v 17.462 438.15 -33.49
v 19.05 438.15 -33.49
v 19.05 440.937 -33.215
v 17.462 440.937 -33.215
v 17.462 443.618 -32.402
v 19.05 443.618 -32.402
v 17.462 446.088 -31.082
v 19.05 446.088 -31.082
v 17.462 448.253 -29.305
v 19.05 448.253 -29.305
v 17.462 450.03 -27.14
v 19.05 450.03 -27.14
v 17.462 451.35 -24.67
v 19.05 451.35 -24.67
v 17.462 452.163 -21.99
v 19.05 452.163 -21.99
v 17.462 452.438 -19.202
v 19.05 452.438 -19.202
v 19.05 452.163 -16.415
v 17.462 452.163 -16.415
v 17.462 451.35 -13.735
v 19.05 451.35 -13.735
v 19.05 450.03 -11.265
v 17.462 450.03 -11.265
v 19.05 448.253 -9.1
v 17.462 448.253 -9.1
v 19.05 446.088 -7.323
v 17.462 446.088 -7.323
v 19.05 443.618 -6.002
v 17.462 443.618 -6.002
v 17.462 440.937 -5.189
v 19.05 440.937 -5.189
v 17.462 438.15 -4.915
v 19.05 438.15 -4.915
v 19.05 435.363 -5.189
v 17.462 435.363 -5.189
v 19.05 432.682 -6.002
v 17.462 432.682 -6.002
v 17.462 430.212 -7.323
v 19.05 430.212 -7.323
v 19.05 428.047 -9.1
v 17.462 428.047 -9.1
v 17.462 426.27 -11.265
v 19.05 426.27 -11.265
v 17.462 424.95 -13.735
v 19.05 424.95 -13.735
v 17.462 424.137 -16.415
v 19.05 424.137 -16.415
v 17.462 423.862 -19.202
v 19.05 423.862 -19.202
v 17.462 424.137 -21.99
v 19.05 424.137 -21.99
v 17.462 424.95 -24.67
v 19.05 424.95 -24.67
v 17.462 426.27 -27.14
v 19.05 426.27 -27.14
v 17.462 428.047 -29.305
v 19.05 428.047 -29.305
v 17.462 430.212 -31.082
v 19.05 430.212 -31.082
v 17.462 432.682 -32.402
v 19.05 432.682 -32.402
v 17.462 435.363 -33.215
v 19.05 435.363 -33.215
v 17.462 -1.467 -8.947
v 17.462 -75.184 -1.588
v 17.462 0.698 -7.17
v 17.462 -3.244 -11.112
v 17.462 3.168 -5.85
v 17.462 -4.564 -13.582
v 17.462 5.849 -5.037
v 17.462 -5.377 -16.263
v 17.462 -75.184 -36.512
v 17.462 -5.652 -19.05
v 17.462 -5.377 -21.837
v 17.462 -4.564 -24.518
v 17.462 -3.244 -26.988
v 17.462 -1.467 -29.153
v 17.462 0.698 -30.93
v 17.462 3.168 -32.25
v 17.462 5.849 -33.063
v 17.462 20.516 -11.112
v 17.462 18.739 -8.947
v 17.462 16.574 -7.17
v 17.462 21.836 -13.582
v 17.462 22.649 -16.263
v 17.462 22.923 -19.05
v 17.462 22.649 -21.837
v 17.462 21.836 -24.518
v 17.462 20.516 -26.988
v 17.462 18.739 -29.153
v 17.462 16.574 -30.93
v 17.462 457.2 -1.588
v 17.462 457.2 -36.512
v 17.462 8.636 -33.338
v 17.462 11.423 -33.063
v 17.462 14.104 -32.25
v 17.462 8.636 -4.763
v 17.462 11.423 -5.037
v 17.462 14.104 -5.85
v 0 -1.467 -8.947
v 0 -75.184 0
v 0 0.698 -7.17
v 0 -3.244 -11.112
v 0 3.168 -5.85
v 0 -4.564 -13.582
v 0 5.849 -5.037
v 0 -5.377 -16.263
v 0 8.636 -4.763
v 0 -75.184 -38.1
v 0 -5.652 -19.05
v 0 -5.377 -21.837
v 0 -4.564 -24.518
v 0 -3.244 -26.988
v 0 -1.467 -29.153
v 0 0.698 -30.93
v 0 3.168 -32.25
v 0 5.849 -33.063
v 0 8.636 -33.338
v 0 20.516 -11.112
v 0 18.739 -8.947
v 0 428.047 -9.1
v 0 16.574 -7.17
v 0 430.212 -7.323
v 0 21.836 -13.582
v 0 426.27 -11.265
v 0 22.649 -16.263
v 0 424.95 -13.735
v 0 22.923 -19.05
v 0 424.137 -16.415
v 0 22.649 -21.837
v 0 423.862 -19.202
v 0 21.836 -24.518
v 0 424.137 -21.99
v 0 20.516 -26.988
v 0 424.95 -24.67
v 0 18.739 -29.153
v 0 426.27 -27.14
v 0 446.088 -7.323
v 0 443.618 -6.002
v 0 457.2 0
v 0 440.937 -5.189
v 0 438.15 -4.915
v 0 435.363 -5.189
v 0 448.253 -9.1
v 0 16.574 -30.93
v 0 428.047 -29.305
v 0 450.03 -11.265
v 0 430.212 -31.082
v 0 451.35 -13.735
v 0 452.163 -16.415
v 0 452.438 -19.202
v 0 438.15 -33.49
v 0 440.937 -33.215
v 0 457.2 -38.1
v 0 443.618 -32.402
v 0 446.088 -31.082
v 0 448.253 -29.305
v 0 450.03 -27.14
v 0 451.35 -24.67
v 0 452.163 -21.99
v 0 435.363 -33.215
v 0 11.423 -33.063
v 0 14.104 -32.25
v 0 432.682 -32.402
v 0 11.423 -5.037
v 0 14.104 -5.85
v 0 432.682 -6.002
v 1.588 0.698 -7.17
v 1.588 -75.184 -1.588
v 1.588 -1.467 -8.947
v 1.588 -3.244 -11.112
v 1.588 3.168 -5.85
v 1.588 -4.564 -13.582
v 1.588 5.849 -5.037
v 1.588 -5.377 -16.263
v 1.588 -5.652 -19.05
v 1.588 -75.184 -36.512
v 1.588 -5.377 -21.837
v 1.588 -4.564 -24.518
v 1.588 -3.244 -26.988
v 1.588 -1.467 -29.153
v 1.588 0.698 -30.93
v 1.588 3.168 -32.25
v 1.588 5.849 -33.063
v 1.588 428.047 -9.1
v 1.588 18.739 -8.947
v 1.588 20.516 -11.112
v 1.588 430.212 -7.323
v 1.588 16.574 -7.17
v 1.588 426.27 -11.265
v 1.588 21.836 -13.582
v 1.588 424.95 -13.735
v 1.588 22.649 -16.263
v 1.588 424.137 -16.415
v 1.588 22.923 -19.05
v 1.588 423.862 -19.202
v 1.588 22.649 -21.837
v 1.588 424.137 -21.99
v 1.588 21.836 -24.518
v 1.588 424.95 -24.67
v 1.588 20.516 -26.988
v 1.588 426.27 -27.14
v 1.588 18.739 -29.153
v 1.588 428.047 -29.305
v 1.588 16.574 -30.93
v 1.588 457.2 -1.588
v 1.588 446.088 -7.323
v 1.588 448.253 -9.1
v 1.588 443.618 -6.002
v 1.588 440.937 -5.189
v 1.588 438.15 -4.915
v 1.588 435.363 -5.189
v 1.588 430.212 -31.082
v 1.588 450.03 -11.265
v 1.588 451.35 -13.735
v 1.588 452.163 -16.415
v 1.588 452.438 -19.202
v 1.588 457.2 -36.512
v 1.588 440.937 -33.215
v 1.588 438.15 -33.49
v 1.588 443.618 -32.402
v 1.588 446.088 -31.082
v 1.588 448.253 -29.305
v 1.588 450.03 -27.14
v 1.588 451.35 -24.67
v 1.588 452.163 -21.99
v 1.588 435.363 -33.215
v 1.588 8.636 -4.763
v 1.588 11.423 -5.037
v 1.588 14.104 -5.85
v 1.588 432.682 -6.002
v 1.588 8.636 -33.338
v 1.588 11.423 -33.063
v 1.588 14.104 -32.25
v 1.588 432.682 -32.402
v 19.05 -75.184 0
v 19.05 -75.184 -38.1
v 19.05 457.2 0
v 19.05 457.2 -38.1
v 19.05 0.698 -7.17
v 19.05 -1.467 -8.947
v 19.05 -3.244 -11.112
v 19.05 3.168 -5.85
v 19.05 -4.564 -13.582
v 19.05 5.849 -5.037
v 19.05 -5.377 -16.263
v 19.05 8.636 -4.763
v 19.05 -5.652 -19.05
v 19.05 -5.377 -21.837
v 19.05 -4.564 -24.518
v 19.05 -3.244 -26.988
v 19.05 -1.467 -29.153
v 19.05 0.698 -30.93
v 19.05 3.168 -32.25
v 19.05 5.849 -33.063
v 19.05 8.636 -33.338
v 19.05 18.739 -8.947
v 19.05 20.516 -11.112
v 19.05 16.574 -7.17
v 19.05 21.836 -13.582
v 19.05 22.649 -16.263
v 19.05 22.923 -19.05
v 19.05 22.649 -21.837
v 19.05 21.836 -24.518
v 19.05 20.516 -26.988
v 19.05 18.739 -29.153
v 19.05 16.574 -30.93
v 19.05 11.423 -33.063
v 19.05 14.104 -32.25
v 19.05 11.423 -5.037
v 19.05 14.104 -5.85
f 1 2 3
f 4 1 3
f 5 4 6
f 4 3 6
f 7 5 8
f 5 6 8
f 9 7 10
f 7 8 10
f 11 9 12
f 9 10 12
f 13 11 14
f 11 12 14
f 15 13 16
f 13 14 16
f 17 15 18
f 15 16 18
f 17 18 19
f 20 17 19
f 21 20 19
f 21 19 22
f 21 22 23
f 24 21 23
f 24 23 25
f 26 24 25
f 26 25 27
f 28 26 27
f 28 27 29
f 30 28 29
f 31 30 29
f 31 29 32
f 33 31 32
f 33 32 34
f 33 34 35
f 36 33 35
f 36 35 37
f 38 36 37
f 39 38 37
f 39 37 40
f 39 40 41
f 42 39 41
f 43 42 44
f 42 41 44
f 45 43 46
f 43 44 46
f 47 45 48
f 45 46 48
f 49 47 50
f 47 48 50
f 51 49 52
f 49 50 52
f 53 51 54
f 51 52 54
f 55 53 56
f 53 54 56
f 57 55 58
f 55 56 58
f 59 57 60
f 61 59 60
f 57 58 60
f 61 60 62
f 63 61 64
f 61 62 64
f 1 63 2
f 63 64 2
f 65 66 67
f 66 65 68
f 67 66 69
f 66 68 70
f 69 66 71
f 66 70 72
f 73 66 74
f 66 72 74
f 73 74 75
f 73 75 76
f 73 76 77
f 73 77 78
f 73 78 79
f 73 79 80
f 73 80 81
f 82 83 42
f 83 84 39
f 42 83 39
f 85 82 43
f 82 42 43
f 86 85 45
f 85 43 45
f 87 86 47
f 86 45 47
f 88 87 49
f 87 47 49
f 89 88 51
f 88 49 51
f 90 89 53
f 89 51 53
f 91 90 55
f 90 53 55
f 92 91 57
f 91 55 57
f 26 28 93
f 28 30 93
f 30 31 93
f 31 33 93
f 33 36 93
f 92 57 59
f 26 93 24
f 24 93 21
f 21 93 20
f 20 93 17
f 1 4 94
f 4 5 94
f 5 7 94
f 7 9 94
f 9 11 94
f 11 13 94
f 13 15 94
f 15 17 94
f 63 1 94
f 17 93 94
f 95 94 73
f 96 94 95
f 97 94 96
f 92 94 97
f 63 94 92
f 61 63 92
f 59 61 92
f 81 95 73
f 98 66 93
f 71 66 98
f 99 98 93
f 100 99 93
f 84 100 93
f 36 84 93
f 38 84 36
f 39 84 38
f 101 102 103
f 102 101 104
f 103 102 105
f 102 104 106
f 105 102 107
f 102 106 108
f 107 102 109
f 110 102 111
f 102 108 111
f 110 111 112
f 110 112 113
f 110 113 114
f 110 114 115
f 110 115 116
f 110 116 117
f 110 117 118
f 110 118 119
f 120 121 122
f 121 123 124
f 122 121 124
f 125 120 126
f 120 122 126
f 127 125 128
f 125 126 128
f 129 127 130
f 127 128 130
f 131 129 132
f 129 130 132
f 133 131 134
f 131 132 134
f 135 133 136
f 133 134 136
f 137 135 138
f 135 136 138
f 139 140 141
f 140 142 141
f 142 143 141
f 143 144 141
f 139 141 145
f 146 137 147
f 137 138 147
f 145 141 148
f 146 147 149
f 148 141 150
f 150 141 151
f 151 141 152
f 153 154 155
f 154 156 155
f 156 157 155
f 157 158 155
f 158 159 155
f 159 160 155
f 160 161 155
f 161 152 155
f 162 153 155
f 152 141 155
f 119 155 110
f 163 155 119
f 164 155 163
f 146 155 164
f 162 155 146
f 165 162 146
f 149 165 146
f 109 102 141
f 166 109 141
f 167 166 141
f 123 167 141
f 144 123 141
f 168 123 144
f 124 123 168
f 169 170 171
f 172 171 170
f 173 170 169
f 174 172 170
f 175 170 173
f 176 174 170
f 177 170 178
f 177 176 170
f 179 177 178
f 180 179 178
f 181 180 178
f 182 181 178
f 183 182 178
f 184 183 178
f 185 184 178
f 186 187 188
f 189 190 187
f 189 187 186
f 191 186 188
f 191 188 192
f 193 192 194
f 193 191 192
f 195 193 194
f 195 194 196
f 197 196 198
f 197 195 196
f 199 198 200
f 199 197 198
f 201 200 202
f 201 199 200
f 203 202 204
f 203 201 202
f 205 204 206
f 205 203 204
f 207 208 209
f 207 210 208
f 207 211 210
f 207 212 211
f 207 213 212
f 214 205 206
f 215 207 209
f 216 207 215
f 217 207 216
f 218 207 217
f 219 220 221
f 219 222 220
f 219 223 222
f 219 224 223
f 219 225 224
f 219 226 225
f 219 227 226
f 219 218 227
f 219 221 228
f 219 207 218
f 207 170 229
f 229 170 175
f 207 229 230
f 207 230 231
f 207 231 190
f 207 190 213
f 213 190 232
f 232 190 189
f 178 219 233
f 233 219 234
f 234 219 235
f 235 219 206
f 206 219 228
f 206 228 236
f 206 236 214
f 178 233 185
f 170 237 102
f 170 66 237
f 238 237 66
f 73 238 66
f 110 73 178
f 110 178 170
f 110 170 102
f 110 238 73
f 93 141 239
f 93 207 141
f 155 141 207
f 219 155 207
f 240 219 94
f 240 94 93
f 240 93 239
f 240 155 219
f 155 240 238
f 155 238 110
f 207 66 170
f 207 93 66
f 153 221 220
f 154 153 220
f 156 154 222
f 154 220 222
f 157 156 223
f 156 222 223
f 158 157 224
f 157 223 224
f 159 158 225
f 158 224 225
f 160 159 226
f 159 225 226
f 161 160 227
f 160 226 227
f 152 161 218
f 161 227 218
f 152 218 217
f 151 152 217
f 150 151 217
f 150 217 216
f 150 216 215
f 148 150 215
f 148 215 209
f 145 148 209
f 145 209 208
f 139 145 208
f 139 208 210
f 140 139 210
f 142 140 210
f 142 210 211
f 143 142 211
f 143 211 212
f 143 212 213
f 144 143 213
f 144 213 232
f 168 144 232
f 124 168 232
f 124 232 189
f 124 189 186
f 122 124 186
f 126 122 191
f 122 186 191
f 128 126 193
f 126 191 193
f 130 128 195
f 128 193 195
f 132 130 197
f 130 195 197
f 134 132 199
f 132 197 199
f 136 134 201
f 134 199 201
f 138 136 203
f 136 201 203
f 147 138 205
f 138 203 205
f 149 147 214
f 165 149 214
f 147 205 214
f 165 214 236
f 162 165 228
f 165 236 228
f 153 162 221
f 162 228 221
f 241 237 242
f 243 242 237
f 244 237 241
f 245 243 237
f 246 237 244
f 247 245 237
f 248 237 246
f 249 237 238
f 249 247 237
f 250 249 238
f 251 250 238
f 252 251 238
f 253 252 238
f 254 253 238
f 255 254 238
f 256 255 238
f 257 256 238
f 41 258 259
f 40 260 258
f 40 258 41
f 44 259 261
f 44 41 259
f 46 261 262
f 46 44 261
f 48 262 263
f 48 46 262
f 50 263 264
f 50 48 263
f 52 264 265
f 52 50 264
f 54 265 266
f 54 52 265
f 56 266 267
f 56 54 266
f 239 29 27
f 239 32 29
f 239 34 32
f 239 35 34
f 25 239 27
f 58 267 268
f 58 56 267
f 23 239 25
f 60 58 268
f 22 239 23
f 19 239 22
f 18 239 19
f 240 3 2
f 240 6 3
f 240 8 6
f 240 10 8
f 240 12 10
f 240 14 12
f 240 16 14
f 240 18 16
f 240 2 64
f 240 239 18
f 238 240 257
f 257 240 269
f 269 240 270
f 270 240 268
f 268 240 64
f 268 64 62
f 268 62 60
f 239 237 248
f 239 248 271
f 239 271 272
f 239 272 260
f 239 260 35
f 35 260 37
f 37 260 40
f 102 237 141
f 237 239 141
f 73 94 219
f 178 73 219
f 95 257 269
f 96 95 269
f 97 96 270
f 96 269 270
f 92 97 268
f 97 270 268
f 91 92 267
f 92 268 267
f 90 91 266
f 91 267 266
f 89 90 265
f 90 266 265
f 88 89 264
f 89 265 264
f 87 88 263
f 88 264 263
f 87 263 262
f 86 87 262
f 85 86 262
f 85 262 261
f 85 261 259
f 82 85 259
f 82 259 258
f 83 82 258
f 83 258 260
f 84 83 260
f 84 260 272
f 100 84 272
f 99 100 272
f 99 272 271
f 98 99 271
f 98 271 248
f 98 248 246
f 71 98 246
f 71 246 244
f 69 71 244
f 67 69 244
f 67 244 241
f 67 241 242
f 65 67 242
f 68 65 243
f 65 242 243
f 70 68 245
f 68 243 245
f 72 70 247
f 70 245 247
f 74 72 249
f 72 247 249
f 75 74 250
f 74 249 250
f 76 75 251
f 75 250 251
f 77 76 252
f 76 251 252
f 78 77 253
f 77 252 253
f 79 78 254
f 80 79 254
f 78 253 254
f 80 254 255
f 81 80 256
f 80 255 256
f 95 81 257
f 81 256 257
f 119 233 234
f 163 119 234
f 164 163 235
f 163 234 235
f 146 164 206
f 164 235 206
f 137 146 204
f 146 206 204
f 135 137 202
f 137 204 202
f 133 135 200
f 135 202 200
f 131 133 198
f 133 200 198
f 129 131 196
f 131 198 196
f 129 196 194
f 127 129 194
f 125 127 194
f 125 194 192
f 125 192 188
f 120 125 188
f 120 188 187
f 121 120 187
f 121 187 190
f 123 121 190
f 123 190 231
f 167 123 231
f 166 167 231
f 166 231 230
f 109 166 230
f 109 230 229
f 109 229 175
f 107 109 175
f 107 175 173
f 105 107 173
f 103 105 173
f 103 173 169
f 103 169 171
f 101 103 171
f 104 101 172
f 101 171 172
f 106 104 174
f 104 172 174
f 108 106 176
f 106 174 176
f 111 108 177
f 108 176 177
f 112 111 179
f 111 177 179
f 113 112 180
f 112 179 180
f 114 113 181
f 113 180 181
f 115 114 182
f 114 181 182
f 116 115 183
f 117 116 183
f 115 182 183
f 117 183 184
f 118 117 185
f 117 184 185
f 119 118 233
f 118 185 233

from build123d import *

# Parameters (mm, degrees)
SKETCH1_W           = 19.05
SKETCH1_H           = 38.1
SKETCH1_W_2         = 15.875
SKETCH1_H_2         = 34.925
EXTRUDE_THIN1_DEPTH = 457.2
SKETCH3_W           = 19.05
SKETCH3_H           = 38.1
SKETCH3_W_2         = 15.875
SKETCH3_H_2         = 34.925
EXTRUDE_THIN2_DEPTH = 75.184
SKETCH4_R           = 14.2875
CUT_EXTRUDE1_DEPTH  = 20.05


with BuildPart() as part:
    # Sketch1 → Extrude-Thin1 (new body)
    with BuildSketch(Plane(origin=(0, 0, 0), x_dir=(1, 0, 0), z_dir=(0, 1, 0))):
        with Locations((9.525, 19.05)):
            Rectangle(SKETCH1_W, SKETCH1_H)
        with Locations((9.525, 19.05)):
            Rectangle(SKETCH1_W_2, SKETCH1_H_2, mode=Mode.SUBTRACT)
    extrude(amount=EXTRUDE_THIN1_DEPTH)

    # Sketch3 → Extrude-Thin2 (add)
    with BuildSketch(Plane(origin=(0, 0, 0), x_dir=(-1, 0, 0), z_dir=(0, -1, 0))):
        with Locations((-9.525, 19.05)):
            Rectangle(SKETCH3_W, SKETCH3_H)
        with Locations((-9.525, 19.05)):
            Rectangle(SKETCH3_W_2, SKETCH3_H_2, mode=Mode.SUBTRACT)
    extrude(amount=EXTRUDE_THIN2_DEPTH)

    # Sketch4 → Cut-Extrude1 (cut, through all)
    with BuildSketch(Plane(origin=(19.05, 0, 0), x_dir=(0, 0, -1), z_dir=(1, 0, 0))):
        with Locations((19.2024, 438.15)):
            Circle(SKETCH4_R)
        with Locations((19.05, 8.636)):
            Circle(SKETCH4_R)
    extrude(amount=-CUT_EXTRUDE1_DEPTH, mode=Mode.SUBTRACT)


solid = part.part
